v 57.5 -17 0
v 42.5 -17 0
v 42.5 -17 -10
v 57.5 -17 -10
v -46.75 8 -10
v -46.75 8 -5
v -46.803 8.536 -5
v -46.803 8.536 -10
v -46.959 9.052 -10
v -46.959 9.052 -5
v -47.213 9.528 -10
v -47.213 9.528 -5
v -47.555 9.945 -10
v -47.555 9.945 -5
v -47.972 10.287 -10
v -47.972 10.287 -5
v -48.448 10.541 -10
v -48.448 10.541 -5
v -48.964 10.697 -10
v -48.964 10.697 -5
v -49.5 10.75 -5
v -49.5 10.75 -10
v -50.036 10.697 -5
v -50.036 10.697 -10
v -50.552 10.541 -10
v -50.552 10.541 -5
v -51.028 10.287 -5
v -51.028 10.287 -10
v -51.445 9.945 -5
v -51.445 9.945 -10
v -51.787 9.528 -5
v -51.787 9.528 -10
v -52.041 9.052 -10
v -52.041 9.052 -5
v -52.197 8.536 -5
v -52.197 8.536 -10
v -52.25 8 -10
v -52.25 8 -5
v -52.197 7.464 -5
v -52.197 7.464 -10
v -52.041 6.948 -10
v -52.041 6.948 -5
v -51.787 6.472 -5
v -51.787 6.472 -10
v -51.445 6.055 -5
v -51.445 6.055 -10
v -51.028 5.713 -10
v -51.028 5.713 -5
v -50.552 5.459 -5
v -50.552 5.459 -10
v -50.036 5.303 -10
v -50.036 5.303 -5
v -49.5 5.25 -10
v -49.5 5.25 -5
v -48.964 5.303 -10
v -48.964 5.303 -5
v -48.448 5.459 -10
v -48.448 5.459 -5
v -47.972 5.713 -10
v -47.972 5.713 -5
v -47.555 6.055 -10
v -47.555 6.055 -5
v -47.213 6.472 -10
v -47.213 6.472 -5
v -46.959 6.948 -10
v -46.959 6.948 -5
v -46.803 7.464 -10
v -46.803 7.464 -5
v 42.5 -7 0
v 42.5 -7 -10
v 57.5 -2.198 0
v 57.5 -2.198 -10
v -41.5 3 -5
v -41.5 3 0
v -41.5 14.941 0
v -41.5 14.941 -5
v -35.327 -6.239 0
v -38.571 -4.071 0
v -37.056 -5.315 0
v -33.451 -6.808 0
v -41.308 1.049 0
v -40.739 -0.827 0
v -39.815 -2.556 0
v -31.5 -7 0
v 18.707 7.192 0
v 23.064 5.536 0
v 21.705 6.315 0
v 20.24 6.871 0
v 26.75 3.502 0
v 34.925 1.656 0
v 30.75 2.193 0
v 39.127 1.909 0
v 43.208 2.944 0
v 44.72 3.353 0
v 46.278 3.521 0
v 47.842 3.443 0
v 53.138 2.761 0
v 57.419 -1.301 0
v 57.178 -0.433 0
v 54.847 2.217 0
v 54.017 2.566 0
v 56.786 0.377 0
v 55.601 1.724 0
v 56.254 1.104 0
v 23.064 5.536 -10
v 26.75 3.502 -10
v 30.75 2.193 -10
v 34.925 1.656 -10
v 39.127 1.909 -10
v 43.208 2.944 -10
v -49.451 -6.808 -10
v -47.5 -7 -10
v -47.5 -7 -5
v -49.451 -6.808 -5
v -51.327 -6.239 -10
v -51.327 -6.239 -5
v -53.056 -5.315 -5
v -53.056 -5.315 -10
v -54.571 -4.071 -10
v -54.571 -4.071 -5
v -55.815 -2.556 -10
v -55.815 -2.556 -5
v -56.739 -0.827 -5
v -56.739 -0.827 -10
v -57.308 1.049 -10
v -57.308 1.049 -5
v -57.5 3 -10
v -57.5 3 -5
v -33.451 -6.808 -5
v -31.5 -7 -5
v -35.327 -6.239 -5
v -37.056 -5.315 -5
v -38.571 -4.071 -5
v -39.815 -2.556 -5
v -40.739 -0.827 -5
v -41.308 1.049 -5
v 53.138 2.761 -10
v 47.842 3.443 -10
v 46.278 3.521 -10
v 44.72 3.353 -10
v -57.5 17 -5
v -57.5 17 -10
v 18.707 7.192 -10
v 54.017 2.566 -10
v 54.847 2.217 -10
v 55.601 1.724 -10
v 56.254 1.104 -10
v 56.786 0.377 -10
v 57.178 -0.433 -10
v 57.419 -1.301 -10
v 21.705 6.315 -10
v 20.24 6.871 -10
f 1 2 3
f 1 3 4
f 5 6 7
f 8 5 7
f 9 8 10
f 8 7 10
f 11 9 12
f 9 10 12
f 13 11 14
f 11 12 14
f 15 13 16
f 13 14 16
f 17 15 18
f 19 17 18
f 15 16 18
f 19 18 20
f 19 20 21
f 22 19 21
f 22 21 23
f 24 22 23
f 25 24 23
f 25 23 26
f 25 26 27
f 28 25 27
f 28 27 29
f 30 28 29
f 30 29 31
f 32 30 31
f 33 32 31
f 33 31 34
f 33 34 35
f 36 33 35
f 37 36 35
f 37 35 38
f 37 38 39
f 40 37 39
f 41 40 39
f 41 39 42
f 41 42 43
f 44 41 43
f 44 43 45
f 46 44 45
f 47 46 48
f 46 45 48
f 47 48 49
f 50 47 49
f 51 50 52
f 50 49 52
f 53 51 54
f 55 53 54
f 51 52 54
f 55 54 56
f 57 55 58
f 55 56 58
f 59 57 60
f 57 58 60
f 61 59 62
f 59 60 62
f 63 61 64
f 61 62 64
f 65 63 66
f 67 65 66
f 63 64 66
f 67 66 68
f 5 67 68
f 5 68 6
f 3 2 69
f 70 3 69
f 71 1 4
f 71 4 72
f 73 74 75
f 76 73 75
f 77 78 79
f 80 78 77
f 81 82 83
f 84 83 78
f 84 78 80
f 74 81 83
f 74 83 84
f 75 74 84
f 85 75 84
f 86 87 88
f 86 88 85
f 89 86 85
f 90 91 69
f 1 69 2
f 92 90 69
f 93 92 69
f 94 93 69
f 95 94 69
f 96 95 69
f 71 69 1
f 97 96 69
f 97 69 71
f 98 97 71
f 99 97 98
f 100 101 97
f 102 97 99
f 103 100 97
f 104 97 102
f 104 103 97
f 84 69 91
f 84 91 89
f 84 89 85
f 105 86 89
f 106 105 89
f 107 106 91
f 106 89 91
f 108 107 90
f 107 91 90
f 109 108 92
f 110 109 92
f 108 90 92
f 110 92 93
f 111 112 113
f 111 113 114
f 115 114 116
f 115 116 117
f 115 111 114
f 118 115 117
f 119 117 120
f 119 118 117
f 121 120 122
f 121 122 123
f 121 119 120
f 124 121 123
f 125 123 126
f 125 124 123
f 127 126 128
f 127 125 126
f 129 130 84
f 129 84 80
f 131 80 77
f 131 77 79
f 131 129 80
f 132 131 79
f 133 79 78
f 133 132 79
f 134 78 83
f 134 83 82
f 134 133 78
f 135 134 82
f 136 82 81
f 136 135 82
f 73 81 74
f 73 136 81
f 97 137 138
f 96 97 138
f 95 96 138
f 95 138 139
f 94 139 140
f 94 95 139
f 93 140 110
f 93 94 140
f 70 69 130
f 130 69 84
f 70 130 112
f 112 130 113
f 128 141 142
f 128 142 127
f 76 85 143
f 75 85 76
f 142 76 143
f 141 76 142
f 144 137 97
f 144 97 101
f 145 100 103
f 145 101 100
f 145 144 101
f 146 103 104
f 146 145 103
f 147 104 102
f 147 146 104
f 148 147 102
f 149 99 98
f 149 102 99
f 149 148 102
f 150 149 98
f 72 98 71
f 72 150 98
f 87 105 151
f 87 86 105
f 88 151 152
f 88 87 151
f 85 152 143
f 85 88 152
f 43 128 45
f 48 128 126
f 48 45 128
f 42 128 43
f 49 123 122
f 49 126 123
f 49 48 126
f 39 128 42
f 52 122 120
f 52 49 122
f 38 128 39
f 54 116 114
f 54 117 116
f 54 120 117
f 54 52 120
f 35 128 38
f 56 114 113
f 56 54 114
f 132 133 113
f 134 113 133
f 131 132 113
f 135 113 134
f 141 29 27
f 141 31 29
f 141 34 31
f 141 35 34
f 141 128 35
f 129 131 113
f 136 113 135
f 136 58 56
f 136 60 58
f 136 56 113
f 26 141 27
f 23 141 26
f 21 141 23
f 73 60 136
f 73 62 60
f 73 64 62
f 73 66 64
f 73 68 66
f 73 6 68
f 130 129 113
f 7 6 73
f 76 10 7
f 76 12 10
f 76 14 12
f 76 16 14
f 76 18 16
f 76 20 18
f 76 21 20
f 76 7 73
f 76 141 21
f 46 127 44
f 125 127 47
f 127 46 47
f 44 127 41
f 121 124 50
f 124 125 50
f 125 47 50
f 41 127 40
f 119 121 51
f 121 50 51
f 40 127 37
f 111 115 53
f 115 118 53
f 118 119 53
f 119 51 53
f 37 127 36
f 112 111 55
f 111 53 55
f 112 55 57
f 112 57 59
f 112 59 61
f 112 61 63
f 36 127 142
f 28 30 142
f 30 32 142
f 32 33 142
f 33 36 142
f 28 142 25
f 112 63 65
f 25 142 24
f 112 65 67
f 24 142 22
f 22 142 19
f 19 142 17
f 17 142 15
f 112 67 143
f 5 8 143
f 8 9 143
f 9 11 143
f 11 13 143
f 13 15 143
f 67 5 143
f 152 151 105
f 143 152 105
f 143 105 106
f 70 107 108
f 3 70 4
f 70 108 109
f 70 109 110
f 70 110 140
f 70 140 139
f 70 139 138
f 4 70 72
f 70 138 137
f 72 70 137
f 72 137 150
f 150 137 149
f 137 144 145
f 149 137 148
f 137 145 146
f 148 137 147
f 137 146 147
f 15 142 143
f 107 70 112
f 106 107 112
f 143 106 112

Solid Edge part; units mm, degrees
sketch "Sketch1" plane through (0, 0, 0) normal (0, 0, 1) x (1, 0, 0)
  line L0 (-57.5, -17) -> (57.5, -17)
  line L1 (57.5, -17) -> (57.5, 17)
  line L2 (57.5, 17) -> (-57.5, 17)
  line L3 (-57.5, 17) -> (-57.5, -17)
extrude "Protrusion1" add sketch "Sketch1" against normal blind 10
sketch "Sketch2" plane through (0, 0, 0) normal (0, 0, 1) x (1, 0, 0)
  line L0 (-57.5, -17) -> (42.5, -17)
  line L1 (42.5, -17) -> (42.5, -7)
  line L2 (42.5, -7) -> (-57.5, -7)
  line L3 (-57.5, -7) -> (-57.5, -17)
extrude "ExtrudedCutout_1" cut sketch "Sketch2" against normal blind 10
sketch "Sketch3" plane through (0, 0, 0) normal (0, 0, 1) x (1, 0, 0)
  line L0 (57.5, 2.2) -> (-57.5, 17)
  line L1 (-57.5, 17) -> (57.5, 17)
  line L2 (57.5, 17) -> (57.5, 2.2)
extrude "ExtrudedCutout_2" cut sketch "Sketch3" against normal blind 10
fillet "Round_1" radius 5 1 edges at (57.5, 2.2, -5)
sketch "Sketch4" plane through (0, 0, 0) normal (0, 0, 1) x (0, 1, 0)
  circle A0 centre (24.0455, -35.6848) radius 22.4024
extrude "ExtrudedCutout_3" cut sketch "Sketch4" against normal blind 10
fillet "Round_2" radius 10 1 edges at (45.2312, 3.7789, -5)
fillet "Round_3" radius 10 1 edges at (21.318, 6.8565, -5)
sketch "Sketch5" plane through (0, 0, 0) normal (0, 0, 1) x (1, 0, 0)
  line L0 (-57.5, -7) -> (-41.5, -7)
  line L1 (-41.5, -7) -> (-41.5, 14.9409)
  line L2 (-41.5, 14.9409) -> (-57.5, 17)
  line L3 (-57.5, 17) -> (-57.5, -7)
extrude "ExtrudedCutout_4" cut sketch "Sketch5" against normal blind 5
fillet "Round_4" radius 10 1 edges at (-41.5, -7, -2.5)
sketch "Sketch6" plane through (-44.5, 5, -5) normal (0, 0, 1) x (1, 0, 0)
  circle A0 centre (-5, 3) radius 2.75
extrude "ExtrudedCutout_6" cut sketch "Sketch6" against normal blind 5.5
fillet "Round_5" radius 10 1 edges at (-57.5, -7, -7.5)
